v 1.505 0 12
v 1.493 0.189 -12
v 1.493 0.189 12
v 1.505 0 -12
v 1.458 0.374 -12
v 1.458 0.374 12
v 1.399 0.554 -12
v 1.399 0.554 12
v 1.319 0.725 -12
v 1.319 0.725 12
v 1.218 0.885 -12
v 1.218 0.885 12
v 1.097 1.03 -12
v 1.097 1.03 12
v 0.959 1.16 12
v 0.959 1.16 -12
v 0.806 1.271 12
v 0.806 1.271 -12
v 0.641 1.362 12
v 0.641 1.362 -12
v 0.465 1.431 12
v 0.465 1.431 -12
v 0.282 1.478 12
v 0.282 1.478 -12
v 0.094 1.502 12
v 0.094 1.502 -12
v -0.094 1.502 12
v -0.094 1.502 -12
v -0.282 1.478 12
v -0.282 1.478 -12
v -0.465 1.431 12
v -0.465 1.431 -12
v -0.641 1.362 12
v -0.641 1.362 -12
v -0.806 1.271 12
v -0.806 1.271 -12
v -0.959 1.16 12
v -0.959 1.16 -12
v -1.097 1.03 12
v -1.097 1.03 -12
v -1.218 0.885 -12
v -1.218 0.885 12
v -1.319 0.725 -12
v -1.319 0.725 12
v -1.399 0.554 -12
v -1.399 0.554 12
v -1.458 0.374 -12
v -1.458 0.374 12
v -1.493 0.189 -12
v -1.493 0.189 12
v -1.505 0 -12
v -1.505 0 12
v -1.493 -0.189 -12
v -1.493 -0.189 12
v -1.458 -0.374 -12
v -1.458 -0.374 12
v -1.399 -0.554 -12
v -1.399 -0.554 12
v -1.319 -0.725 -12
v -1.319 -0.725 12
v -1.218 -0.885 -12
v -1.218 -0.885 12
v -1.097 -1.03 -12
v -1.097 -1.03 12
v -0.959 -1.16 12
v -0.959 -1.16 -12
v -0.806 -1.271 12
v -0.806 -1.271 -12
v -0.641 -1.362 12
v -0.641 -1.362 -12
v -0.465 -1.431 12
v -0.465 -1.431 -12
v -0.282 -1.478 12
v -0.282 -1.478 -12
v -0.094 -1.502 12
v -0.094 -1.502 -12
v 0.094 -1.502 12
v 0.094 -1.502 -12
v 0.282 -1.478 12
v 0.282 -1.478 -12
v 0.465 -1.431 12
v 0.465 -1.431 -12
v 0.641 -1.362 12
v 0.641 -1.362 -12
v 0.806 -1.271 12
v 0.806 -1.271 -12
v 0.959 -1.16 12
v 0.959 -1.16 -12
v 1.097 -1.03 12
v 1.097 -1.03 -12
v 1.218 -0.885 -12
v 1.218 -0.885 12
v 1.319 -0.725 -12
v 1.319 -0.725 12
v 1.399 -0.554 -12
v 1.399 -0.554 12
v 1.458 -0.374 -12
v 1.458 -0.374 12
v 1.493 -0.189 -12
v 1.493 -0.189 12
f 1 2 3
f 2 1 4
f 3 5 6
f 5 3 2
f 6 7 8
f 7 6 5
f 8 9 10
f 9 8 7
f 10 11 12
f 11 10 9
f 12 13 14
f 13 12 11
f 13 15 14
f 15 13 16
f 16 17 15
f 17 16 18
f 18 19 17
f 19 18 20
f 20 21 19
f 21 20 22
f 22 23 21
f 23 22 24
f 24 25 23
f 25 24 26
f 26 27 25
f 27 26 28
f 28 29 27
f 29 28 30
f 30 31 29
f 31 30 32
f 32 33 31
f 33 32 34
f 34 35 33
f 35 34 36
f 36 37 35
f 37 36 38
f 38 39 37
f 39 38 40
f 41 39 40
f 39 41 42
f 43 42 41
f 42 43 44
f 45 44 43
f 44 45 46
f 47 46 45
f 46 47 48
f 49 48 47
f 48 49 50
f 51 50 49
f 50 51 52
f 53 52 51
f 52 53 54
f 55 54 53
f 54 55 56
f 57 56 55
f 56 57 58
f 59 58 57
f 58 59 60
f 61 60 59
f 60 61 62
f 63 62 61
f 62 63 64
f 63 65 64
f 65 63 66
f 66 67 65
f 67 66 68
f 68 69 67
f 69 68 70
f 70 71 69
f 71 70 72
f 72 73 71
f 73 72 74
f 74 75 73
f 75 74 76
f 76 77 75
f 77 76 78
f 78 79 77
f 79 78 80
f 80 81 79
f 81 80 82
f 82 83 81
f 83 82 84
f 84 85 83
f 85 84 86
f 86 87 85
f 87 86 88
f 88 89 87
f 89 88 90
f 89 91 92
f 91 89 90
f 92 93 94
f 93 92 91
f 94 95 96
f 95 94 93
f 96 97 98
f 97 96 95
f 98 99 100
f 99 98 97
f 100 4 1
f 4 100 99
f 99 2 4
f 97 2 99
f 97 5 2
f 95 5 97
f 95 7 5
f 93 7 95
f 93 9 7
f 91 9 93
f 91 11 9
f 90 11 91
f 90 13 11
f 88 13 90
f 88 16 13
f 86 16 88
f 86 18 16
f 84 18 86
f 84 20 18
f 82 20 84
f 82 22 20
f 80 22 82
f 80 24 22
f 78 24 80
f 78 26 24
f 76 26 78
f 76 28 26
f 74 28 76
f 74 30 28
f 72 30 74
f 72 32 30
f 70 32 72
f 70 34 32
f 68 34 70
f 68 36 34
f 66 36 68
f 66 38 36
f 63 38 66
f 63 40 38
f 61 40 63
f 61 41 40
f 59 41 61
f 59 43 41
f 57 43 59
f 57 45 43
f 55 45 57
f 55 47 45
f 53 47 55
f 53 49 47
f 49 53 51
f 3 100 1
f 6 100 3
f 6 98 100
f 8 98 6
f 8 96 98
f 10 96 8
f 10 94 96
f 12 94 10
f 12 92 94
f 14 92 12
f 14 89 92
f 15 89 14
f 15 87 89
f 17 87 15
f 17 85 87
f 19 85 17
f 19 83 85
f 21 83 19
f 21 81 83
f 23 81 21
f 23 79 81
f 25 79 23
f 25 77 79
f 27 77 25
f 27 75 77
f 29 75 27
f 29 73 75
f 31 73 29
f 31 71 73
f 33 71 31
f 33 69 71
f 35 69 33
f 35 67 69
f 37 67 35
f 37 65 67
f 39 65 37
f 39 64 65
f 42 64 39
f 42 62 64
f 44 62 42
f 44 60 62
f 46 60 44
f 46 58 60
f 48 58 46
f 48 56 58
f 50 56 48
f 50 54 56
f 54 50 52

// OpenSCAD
// file: ../robot_settings.scad
main_box_x = 95; // 96
main_box_y = 102;
main_box_z = 74; // 74.5
wall_thickness = 2;

rail_gap = 2;
rail_inset = 7;

rail_thickness = 7;
rail_length = 250;
rail_width = 200;

raspberry_pi_screw_seperation_y = 57;
raspberry_pi_screw_seperation_z = 48;
raspberry_pi_peg_h = 4;

gears_module = 1;
pinion_gear_teeth = 30;
pinion_gear_width = 5;
pinion_gear_bore = 4;

gears_setback_distance = 25;
gear_post_height = 2 * pinion_gear_width + rail_thickness + 8 ;

steering_motor_mount_x = 45;
steering_motor_mount_y = 36;
steering_motor_mount_z = 18;
steering_motor_mount_setback_distance = gears_setback_distance + 16;

dc_motor_drivertype = "Teyleten"; // Teyleten
isAdafruit = (dc_motor_drivertype == "Adafruit");

drv8871_x = isAdafruit ? 20.3 : 21.6;
drv8871_y = isAdafruit ?  24 : 25;

drv8871_z = 2;
drv8871_screw_d = 2.5;
drv8871_solder_points_z = 2;

drv8871mount_edge_x = 1.5;
drv8871mount_edge_wall = 3;
drv8871mount_z = 5;
drv8871mount_x = drv8871_x +  drv8871mount_edge_wall - 2* drv8871mount_edge_x;
drv8871mount_y = 19;

drv8871_screw_distance = 15.64;
drv8871_solder_points_d = 1.66;
drv8871_solder_offset_y = 4.4;
drv8871_solder_inner_points_distance = 5;
drv8871_solder_outer_points_distance = 12;

dc_motor_housing_minus_encoder_z = 48;
dc_motor_encoder_z = 9.33;
dc_motor_encoder_wheel_d = 13.4;
dc_motor_encoder_wheel_thickness = 5;
dc_motor_encoder_wheel_gap = 3;
dc_motor_encoder_circuit_thickness = 2;
dc_motor_cutout_d = 24.8;
dc_motor_cutout_z = 19.5;

dc_motor_screw_head_z = 2;
dc_motor_screw_head_d = 5.6;
dc_motor_screw_d = 3.2;
dc_motor_screw_offset = 8.5;

dc_motor_axle_ring_z = 3;
dc_motor_axle_ring_d = 7.2;
dc_motor_axle_cutout_d = 4.5;
dc_motor_axle_cutout_z = 10;
dc_motor_axle_notch_cutout = 0.4;
dc_motor_axle_notch_cutout_z = 6;

pdmount_x = 20;
pdmount_y = 30;
pdmount_z = 2;
pdmount_edge_x = 1.5;
pdmount_edge_wall = 3;

steering_shaft_z = gear_post_height + dc_motor_axle_ring_z + pinion_gear_width + 15;
steering_shaft_d = 7;
steering_shaft_motor_fitting_d = 9;

lidar_mount_y = 110;
lidar_mount_x = 65 + 20;
lidar_narrow_screws = 40;
lidar_wide_screws = 56;
lidar_front_to_back_screws = 70;
lidar_screw_d = 3;
lidar_circuitboard_x = 20;
lidar_circuitboard_y = 35;
lidar_circuitboard_z = 1.2;
lidar_cord_length = 29;

ball_bearing_height = 7;
ball_bearing_outer_diameter = 22;
ball_bearing_inner_diameter = 8;

pull_bar_radius = 3.3;

rack_module = 1;
rack_length = main_box_x / 2;
rack_height = 10;
rack_width = 10;
rack_teeth = 30;
rack_bore = 3;

// tire hardware
axle_length = 30;
axle_reciever_inner_diameter = 7.75;
axle_reciever_length = 18.8;
axle_notch_length = 7;
axle_notch_cutout = 2.4;

// power distribution bar
power_bar_cutout_x = 96;
power_bar_y = 19.1;
power_bar_z = 1.5;
power_bar_screw_distance = 91.4;
power_bar_screw_d = 2.8;
power_bar_standoff_z = 5;
power_bar_standoff_d = 6.83;

// breadboard
breadboard_wall_thickness = 3;
breadboard_width = 55;
breadboard_length = 83;
breadboard_height = 10.5;
breadboard_notch_width = 3.8;
breadboard_longside_notch_separation = 58.2 - breadboard_notch_width / 2;
breadboard_shortside_notch_separation = 26.3 - breadboard_notch_width;
// main file
include <../robot_settings.scad>
$fn=50;

module apparatus_peg()
{
  cylinder(h = ball_bearing_outer_diameter + 2, d = 3 + 0.01 , center = true);
}
apparatus_peg();
